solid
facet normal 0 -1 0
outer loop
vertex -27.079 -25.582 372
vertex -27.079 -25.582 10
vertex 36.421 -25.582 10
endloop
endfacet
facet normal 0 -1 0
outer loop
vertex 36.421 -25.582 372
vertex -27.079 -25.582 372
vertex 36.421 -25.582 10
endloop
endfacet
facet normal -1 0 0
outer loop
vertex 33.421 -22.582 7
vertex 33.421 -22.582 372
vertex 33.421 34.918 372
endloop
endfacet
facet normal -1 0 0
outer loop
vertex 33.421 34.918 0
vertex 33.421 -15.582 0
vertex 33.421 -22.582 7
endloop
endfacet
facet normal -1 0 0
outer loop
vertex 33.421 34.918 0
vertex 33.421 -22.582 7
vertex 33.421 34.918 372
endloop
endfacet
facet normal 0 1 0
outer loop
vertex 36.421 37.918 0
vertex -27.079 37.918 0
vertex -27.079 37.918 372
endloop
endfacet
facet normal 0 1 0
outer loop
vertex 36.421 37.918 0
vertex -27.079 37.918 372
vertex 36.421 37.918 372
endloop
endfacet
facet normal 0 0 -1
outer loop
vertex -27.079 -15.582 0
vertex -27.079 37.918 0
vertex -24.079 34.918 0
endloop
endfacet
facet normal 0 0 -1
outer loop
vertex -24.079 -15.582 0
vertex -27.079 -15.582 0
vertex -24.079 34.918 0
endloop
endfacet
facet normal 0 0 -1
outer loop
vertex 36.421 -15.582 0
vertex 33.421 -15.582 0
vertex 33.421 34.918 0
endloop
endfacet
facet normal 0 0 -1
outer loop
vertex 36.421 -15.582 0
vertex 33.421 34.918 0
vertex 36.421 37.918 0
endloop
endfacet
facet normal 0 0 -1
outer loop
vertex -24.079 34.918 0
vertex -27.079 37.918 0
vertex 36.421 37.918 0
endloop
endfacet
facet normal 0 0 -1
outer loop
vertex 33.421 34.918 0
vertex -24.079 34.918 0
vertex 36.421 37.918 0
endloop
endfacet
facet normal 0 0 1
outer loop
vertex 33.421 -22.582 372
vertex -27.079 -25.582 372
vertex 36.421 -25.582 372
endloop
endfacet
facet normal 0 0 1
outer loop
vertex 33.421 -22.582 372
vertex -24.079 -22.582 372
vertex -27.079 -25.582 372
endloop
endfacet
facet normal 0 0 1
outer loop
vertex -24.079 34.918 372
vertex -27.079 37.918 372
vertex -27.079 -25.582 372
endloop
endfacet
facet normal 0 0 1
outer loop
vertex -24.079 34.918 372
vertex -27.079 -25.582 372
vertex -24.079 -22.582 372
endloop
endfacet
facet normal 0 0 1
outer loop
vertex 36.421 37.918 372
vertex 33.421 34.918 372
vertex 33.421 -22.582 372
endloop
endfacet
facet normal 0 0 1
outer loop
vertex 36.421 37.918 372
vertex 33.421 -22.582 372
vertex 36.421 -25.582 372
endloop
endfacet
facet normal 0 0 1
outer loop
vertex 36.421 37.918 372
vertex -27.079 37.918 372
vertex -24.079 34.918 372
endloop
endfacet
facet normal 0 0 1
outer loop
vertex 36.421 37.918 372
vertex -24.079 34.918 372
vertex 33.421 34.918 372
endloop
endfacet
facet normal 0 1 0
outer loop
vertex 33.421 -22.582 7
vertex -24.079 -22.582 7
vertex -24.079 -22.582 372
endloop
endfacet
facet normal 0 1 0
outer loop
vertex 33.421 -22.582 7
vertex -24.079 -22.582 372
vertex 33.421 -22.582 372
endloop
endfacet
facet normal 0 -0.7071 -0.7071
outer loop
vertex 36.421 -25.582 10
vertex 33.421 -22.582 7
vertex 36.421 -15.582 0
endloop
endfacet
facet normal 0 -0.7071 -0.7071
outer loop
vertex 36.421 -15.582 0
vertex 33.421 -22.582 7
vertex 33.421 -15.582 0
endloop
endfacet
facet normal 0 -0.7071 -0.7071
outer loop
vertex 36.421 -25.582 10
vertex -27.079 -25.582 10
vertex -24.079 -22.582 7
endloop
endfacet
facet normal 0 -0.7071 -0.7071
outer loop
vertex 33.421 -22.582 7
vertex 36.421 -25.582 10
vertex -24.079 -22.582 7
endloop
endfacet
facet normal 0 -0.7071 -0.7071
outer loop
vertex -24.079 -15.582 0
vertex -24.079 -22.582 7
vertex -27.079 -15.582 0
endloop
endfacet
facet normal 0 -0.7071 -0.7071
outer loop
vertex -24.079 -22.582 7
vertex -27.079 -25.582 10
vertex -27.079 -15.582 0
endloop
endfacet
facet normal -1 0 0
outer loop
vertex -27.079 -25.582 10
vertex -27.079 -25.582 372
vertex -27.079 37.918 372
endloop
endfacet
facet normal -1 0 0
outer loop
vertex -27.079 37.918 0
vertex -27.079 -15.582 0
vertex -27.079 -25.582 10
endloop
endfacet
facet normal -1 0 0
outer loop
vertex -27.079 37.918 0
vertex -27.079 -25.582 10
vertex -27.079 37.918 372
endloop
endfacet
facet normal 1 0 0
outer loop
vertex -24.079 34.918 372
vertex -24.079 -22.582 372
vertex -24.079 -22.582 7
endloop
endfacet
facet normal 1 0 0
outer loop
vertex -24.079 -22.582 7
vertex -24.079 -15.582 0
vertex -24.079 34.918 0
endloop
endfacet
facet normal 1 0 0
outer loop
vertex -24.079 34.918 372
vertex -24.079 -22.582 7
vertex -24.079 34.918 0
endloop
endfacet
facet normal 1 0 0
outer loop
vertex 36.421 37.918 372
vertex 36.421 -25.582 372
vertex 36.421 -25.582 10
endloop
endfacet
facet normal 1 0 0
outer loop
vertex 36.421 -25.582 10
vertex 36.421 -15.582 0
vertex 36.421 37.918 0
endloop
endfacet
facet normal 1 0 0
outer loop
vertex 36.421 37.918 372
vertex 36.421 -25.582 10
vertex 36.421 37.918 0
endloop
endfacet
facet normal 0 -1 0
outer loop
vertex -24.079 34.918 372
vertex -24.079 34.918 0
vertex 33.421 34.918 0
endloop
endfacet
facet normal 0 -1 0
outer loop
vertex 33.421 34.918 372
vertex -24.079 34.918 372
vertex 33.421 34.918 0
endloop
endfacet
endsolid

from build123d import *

# Parameters (mm, degrees)
F0_W        = 63.5
F0_H        = 63.5
F0_W_2      = 57.5
F0_H_2      = 57.5
F1_DEPTH    = 372
F2_T1_DEPTH = 114.9336597593


# Not quite as in the source:
# - a fillet or chamfer that OpenCascade refuses, or shapes differently, is made with other operations: its cross-section is extruded or revolved along the edge and cut away or added


with BuildPart() as f1:
    # F0 (on Top) → F1 (new body)
    with BuildSketch(Plane.XY):
        with Locations((4.6706348658, 6.1677011834)):
            Rectangle(F0_W, F0_H)
        with Locations((4.6706348658, 6.1677011834)):
            Rectangle(F0_W_2, F0_H_2, mode=Mode.SUBTRACT)
    extrude(amount=F1_DEPTH)

    # F2: chamfer of 10 on 1 edges, made by hand

    # F2_s2 → F2_t1 (cut)
    with BuildSketch(Plane.YZ.offset(-52.7961950139)):
        Polygon((-25.5822988166, 10), (-15.5822988166, 0), (-25.5822988166, 0), align=None)
    extrude(amount=F2_T1_DEPTH, mode=Mode.SUBTRACT)


solid = f1.part
